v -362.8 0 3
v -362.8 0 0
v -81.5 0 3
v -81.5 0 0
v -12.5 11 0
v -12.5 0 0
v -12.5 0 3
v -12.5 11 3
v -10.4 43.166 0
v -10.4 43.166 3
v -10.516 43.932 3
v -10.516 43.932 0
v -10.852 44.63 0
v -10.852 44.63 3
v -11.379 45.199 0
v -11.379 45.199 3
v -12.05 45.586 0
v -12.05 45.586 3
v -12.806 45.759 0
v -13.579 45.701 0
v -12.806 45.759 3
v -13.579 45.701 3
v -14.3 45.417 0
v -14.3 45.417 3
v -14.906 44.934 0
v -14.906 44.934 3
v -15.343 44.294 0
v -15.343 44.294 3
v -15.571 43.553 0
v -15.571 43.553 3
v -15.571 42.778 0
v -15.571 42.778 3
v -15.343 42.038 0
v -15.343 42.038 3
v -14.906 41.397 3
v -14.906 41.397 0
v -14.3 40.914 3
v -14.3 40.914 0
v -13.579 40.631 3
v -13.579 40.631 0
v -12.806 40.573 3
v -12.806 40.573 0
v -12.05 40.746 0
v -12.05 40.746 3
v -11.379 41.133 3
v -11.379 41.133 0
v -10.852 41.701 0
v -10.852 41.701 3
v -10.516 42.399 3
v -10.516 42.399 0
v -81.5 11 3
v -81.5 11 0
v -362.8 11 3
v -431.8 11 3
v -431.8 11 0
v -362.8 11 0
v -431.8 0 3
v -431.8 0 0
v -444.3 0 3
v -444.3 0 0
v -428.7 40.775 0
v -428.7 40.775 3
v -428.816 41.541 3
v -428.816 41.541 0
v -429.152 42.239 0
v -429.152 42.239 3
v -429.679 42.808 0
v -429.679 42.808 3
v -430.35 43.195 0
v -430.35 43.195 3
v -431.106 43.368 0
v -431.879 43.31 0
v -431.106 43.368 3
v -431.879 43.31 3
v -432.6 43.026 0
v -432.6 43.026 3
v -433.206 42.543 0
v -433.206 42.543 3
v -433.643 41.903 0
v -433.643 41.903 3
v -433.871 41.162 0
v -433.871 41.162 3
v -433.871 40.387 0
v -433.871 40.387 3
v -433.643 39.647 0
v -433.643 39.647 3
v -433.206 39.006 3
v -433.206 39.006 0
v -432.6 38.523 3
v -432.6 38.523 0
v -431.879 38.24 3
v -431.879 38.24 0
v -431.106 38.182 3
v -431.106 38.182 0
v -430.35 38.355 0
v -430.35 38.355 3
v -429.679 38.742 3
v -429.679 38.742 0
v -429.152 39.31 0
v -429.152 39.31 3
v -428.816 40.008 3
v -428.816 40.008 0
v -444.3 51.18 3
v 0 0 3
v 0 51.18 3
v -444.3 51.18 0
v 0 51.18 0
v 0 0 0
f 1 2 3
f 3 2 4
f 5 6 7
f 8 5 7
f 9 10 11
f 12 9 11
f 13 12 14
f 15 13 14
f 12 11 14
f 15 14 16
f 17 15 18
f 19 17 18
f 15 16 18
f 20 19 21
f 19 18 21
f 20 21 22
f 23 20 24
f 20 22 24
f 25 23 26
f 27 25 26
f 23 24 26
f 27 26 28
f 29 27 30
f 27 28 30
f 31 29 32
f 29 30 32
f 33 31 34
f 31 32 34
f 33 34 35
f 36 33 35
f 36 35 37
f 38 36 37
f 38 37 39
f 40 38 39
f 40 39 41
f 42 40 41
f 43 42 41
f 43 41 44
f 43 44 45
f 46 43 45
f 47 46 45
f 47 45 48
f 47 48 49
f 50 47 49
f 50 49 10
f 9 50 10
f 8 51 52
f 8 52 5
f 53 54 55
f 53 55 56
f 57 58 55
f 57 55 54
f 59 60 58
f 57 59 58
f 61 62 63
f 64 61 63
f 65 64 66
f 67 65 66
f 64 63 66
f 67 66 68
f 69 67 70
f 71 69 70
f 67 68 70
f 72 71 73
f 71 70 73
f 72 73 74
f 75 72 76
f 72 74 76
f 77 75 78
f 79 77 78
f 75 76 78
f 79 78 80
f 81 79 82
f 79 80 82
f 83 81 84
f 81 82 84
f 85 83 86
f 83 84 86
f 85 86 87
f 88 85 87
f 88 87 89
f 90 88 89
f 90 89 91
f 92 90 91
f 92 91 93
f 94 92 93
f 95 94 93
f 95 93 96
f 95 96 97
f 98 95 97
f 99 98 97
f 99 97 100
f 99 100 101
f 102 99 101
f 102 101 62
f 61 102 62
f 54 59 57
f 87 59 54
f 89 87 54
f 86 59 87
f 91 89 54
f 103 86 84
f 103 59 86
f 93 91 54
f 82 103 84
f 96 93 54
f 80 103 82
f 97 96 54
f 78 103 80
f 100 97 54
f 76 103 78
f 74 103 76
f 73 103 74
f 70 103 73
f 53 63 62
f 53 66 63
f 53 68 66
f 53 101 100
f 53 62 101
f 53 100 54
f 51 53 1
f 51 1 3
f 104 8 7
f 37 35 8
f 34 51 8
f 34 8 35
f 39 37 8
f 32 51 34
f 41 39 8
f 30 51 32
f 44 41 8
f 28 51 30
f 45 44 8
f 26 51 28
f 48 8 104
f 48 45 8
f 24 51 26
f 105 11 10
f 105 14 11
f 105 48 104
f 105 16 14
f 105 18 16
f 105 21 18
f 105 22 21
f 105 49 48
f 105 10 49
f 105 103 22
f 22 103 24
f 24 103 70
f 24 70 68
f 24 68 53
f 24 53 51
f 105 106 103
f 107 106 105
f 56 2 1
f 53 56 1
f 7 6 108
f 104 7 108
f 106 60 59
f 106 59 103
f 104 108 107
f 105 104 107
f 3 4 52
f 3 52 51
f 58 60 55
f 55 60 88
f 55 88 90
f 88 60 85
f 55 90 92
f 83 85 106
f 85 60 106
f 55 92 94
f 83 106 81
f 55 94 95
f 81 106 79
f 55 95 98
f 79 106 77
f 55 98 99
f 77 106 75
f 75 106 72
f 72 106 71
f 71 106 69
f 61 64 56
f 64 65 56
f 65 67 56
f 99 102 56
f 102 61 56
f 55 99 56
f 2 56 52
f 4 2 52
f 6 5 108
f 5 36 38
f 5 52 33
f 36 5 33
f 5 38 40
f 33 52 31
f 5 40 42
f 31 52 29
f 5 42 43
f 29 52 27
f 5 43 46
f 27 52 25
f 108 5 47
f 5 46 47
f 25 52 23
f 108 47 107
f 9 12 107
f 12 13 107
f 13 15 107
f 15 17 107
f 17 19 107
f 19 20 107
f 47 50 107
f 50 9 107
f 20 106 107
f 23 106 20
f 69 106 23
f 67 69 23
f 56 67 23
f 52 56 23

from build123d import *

# Parameters (mm, degrees)
ESQUISSE1_W             = 444.3
ESQUISSE1_H             = 51.18
BOSS_EXTRU_1_DEPTH      = 3
ESQUISSE2_R             = 2.6
ENL_V_MAT_EXTRU_1_DEPTH = 20
ESQUISSE3_W             = 69
ESQUISSE3_H             = 3
ENL_V_MAT_EXTRU_2_DEPTH = 11


with BuildPart() as part:
    # Esquisse1 → Boss.-Extru.1 (new body)
    with BuildSketch(Plane.XY):
        with Locations((-222.15, 25.59)):
            Rectangle(ESQUISSE1_W, ESQUISSE1_H)
    extrude(amount=BOSS_EXTRU_1_DEPTH)

    # Esquisse2 → Enlèv. mat.-Extru.1 (cut)
    with BuildSketch(Plane.XY.offset(3)):
        with Locations((-13, 43.165806832)):
            Circle(ESQUISSE2_R)
        with Locations((-431.3, 40.774785784)):
            Circle(ESQUISSE2_R)
    extrude(amount=-ENL_V_MAT_EXTRU_1_DEPTH, mode=Mode.SUBTRACT)

    # Esquisse3 → Enlèv. mat.-Extru.2 (cut)
    with BuildSketch(Plane.XZ):
        with Locations((-397.3, 1.5)):
            Rectangle(ESQUISSE3_W, ESQUISSE3_H)
        with Locations((-47, 1.5)):
            Rectangle(ESQUISSE3_W, ESQUISSE3_H)
    extrude(amount=-ENL_V_MAT_EXTRU_2_DEPTH, mode=Mode.SUBTRACT)


solid = part.part
